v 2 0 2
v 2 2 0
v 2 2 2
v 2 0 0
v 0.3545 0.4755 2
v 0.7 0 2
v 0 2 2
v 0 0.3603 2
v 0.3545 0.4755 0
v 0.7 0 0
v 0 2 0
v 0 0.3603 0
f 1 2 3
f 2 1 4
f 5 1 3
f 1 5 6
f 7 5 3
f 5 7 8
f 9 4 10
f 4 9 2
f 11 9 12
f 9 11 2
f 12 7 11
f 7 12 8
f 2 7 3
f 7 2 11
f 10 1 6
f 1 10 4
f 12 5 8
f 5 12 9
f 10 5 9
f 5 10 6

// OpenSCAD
size = [2, 2, 2];
difference() {
    cube(size);
    translate([0.2, 0, 0]) cylinder(h=4, r=0.5);
}
